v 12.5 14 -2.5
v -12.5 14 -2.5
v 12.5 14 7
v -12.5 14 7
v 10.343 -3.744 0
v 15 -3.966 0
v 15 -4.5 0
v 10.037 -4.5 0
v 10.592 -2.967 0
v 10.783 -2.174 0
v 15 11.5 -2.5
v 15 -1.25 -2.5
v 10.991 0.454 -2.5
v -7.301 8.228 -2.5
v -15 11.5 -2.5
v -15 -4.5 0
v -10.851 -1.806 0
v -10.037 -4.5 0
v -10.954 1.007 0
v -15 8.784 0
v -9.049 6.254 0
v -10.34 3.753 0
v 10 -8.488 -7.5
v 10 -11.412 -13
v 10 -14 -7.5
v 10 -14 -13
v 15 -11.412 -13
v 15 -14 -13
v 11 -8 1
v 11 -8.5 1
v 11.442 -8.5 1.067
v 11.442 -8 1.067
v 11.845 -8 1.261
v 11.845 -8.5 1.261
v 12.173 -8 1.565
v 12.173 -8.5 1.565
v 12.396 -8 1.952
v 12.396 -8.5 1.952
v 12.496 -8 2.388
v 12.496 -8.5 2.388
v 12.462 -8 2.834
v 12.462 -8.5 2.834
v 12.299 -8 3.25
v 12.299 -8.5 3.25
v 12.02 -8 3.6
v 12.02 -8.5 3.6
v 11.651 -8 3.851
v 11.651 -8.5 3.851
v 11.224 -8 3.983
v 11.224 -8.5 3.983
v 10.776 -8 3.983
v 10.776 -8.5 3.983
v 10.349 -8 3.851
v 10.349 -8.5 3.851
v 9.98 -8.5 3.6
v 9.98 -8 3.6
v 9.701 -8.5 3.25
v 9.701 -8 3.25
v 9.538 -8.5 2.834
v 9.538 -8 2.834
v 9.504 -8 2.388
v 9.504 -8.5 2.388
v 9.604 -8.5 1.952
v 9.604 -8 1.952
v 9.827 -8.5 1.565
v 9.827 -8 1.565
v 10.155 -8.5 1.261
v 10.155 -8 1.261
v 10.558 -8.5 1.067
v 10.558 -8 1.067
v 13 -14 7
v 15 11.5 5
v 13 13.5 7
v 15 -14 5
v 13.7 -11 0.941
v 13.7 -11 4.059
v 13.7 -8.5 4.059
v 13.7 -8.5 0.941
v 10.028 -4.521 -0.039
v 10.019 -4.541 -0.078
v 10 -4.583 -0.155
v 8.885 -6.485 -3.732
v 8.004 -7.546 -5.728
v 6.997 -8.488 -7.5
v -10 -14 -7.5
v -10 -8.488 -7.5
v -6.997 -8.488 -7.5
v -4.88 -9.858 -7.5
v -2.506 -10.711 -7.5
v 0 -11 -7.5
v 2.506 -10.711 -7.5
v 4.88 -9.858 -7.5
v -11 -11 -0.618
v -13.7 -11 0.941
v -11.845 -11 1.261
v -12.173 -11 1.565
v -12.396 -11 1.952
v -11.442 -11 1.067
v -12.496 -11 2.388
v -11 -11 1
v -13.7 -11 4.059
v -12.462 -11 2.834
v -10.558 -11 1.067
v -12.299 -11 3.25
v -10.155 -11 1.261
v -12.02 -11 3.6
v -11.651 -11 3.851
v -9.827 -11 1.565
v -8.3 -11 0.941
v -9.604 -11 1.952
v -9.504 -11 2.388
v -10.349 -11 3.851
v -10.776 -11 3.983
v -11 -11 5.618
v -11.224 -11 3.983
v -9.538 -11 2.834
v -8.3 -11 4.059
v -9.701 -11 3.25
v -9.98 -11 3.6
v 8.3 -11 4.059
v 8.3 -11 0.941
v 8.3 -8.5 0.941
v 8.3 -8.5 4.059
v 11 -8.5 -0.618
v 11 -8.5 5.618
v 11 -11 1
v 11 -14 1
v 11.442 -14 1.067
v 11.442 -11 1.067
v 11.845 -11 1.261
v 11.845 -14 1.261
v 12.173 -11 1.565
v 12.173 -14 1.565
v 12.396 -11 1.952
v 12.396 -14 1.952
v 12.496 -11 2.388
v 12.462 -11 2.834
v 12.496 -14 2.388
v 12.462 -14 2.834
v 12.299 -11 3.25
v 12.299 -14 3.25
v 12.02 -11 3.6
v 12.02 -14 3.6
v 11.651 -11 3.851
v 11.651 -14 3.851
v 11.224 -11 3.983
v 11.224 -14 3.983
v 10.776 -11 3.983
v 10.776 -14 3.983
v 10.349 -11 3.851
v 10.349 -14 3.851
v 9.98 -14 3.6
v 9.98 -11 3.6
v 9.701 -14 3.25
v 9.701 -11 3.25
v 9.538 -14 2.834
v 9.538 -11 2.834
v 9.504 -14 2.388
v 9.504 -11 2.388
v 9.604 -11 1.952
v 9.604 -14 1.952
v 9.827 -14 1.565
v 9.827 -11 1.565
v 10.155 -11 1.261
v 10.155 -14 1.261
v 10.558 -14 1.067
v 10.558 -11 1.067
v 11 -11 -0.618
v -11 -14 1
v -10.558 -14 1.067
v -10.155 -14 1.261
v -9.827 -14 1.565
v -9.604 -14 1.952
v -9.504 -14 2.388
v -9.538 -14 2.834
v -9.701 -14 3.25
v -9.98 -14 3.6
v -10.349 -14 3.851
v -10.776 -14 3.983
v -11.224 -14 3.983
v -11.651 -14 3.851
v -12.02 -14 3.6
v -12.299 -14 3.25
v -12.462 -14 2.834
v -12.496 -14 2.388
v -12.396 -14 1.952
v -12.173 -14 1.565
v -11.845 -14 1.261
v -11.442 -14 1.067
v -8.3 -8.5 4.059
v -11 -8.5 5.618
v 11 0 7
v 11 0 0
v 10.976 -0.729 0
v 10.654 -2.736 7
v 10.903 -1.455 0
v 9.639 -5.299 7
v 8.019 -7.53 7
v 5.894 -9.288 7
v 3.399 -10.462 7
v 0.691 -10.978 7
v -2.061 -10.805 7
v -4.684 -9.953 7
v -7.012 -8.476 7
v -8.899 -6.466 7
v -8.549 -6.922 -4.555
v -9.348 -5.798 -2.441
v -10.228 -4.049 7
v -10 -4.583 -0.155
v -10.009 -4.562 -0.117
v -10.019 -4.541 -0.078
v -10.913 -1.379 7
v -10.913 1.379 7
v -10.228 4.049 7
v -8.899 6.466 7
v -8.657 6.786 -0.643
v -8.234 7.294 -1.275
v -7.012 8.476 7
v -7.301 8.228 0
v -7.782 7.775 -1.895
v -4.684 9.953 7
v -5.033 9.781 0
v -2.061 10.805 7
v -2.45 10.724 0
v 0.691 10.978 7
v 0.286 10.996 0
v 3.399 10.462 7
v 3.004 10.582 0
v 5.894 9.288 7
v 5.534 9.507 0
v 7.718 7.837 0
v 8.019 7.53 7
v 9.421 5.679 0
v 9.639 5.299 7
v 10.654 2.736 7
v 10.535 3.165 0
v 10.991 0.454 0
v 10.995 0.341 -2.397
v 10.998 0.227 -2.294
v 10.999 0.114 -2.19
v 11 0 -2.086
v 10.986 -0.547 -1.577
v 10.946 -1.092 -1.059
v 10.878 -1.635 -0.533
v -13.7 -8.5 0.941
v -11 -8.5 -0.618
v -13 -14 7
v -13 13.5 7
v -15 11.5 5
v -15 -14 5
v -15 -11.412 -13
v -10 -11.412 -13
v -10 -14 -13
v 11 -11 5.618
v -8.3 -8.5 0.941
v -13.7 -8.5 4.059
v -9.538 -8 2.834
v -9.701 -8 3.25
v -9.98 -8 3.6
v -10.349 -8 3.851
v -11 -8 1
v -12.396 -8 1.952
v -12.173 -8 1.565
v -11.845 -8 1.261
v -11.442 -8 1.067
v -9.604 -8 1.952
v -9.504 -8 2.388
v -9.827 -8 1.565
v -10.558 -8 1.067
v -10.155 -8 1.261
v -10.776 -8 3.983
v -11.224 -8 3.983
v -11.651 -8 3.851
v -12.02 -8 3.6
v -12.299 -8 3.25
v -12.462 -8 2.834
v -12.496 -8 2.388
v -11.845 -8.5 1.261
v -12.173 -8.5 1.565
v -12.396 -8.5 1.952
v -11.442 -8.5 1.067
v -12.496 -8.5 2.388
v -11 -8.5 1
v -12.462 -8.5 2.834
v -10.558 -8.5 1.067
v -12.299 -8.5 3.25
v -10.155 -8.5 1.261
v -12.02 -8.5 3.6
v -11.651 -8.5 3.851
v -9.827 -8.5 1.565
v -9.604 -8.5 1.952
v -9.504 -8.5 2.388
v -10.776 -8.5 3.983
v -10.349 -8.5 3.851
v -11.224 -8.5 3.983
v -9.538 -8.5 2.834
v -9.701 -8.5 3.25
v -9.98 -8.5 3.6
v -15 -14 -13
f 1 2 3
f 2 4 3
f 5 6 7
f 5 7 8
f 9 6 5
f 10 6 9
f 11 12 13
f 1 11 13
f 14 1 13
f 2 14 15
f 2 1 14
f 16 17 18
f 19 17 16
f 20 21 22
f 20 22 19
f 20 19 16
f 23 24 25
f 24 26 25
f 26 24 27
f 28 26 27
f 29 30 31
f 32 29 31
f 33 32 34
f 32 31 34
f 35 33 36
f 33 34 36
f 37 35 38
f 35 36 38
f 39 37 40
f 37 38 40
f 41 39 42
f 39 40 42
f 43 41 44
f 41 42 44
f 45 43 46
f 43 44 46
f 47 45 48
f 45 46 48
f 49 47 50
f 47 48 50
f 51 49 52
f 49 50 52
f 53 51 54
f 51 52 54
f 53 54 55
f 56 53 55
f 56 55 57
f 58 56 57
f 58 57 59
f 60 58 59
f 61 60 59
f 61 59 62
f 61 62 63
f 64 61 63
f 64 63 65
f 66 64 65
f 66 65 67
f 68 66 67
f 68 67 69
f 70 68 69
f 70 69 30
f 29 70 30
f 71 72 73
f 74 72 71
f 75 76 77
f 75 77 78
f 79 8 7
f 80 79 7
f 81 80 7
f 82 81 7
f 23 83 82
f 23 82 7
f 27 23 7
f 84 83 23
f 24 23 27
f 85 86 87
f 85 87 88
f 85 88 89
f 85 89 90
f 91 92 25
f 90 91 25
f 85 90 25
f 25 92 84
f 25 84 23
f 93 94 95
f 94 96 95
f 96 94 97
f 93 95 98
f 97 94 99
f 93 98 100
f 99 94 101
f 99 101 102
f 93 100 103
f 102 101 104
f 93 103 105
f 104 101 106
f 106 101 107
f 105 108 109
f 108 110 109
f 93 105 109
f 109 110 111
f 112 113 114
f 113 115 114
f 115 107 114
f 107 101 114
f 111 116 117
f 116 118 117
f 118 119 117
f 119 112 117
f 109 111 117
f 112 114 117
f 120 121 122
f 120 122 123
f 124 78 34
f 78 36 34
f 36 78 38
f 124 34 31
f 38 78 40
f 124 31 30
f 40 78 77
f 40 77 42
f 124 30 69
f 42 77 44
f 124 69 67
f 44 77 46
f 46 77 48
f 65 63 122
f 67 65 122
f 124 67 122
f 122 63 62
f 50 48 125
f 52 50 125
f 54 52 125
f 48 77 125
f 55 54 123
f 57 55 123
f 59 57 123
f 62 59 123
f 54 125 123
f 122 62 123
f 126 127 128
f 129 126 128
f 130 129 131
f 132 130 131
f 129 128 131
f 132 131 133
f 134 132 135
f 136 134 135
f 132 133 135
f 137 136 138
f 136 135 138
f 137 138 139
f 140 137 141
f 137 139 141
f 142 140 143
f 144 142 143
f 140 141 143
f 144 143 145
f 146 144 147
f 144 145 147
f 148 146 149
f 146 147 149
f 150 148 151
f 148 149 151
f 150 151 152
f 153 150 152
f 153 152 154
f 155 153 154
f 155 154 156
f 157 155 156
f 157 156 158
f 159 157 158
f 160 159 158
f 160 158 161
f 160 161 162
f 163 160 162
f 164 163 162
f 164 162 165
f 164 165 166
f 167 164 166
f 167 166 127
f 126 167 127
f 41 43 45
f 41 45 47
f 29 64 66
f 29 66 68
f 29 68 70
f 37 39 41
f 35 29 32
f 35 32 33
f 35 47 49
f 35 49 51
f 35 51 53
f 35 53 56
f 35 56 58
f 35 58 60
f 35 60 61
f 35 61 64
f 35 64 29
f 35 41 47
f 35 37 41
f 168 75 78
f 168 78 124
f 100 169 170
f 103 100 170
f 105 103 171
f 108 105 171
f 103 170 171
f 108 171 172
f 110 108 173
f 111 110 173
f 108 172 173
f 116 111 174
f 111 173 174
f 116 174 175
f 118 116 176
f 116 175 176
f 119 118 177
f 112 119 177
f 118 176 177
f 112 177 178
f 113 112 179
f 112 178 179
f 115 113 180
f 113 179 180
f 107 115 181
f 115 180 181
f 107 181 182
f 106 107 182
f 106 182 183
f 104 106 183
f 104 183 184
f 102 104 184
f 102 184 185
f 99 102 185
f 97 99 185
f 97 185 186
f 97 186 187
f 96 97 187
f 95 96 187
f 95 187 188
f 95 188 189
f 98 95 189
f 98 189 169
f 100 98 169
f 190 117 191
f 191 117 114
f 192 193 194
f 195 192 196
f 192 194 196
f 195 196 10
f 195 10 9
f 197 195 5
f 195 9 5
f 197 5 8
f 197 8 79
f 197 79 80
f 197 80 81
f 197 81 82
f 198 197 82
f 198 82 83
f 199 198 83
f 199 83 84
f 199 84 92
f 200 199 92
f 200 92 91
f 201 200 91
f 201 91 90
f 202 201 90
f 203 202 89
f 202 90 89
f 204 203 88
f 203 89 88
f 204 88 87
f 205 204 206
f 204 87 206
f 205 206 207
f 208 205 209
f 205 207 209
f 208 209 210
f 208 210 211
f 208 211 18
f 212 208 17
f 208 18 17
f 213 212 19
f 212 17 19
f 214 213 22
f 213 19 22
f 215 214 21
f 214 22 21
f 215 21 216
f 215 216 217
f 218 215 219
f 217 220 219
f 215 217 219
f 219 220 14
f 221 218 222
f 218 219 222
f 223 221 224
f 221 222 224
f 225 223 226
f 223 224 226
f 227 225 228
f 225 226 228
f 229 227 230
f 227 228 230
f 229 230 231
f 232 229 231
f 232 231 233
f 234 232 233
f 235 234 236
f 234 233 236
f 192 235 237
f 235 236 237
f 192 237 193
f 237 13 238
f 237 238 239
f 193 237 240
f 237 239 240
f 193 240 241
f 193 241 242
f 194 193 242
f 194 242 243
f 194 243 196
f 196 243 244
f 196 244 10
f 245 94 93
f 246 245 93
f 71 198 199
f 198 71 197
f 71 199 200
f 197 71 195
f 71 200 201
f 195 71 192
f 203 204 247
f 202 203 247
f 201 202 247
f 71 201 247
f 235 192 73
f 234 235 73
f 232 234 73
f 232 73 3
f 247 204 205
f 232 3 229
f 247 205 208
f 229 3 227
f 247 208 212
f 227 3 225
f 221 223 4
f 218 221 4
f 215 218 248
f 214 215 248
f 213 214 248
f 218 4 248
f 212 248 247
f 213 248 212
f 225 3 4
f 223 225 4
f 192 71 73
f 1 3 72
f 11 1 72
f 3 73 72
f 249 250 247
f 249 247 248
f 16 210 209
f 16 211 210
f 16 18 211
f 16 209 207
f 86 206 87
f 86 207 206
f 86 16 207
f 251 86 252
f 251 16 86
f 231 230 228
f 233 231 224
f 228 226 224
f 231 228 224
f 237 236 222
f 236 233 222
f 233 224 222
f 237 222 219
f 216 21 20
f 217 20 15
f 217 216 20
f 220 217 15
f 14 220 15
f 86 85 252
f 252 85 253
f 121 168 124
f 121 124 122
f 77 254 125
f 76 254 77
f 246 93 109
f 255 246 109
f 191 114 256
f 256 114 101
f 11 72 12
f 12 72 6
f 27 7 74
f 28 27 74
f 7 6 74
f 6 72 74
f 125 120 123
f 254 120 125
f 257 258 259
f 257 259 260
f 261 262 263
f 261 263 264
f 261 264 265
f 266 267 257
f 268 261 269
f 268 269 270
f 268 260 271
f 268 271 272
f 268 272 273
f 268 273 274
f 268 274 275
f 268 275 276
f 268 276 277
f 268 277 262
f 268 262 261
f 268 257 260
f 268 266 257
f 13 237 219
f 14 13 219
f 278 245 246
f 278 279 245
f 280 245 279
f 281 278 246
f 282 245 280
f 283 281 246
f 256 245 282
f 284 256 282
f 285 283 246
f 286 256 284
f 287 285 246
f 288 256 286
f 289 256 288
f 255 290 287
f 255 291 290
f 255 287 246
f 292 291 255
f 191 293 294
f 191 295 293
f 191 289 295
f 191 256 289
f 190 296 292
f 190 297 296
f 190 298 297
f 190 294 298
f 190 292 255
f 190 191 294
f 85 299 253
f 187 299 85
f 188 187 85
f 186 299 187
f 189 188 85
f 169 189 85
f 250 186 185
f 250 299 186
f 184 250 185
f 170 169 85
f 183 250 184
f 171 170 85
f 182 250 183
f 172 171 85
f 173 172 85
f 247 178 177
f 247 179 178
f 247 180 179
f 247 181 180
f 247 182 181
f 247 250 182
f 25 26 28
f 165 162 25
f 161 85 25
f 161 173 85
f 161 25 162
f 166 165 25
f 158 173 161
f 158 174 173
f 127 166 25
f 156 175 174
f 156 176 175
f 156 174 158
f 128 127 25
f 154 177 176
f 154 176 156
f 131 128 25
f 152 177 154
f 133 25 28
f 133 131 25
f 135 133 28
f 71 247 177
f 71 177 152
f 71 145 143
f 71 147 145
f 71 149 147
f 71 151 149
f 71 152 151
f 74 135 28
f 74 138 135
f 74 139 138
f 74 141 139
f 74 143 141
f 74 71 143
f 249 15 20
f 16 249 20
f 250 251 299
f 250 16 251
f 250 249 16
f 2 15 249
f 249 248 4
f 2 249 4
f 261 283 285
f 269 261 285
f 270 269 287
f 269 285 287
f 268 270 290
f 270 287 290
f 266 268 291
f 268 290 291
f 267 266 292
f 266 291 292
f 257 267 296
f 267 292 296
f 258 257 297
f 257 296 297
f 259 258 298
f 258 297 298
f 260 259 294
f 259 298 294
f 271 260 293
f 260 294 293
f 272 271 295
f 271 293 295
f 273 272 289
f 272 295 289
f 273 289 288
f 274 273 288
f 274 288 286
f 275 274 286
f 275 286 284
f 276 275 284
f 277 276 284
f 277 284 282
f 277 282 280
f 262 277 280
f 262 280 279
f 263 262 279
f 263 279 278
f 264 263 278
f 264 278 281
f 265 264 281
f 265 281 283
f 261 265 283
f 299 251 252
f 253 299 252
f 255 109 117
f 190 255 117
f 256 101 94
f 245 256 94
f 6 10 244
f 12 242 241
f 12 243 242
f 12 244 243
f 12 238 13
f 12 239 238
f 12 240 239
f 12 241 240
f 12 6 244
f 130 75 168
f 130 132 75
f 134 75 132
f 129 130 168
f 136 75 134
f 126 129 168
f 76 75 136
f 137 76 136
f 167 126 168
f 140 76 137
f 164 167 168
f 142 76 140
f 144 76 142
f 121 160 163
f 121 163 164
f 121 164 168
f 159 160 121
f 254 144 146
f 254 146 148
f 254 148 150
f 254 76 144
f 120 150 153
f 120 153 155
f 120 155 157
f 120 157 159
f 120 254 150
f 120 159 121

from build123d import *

# Parameters (mm, degrees)
SKETCH1_R           = 11
BOSS_EXTRUDE1_DEPTH = 7
SKETCH2_W           = 5
SKETCH2_H           = 2.5
BOSS_EXTRUDE2_DEPTH = 13
CHAMFER2_SIZE       = 2
BOSS_EXTRUDE6_DEPTH = 2.5
CHAMFER3_SIZE       = 2
CHAMFER4_SIZE       = 2
BOSS_EXTRUDE4_DEPTH = 2.5
CHAMFER6_SIZE       = 2.5
CHAMFER7_SIZE       = 7
CHAMFER7_SIZE_2     = 13.165085257
CUT_EXTRUDE1_START  = -3
SKETCH6_R           = 1.5
CUT_EXTRUDE1_DEPTH  = 2.5
SKETCH7_R           = 1.5
CUT_EXTRUDE2_DEPTH  = 6


with BuildPart() as part:
    # Sketch1 → Boss-Extrude1 (new body)
    with BuildSketch(Plane.XY):
        Polygon((-15, 11.5), (-12.5, 14), (12.5, 14), (15, 11.5), (15, -14), (-15, -14), align=None)
        Circle(SKETCH1_R, mode=Mode.SUBTRACT)
    extrude(amount=BOSS_EXTRUDE1_DEPTH)

    # Sketch2 → Boss-Extrude2 (add)
    with BuildSketch(Plane(origin=(0, 0, 0), x_dir=(-1, 0, 0), z_dir=(0, 0, -1))):
        with Locations((-12.5, -12.75)):
            Rectangle(SKETCH2_W, SKETCH2_H)
        with Locations((12.5, -12.75)):
            Rectangle(SKETCH2_W, SKETCH2_H)
    extrude(amount=BOSS_EXTRUDE2_DEPTH)

    # Chamfer2
    chamfer2_edges = [part.edges().sort_by_distance(p)[0] for p in [
        (-10, -12.75, 0),
        (10, -12.75, 0),
    ]]
    chamfer(chamfer2_edges, length=CHAMFER2_SIZE)

    # Sketch5 → Boss-Extrude6 (add)
    with BuildSketch(Plane.XZ.offset(14)):
        Polygon((-10, -2), (-10, -7.5), (10, -7.5), (10, -2), (8, 0), (-8, 0), align=None)
    extrude(amount=-BOSS_EXTRUDE6_DEPTH)

    # Chamfer3
    chamfer3_edges = [part.edges().sort_by_distance(p)[0] for p in [
        (15, -1.25, 7),
    ]]
    chamfer(chamfer3_edges, length=CHAMFER3_SIZE)

    # Chamfer4
    chamfer4_edges = [part.edges().sort_by_distance(p)[0] for p in [
        (-15, -1.25, 7),
    ]]
    chamfer(chamfer4_edges, length=CHAMFER4_SIZE)

    # Sketch4 → Boss-Extrude4 (add)
    with BuildSketch(Plane(origin=(0, 0, 0), x_dir=(-1, 0, 0), z_dir=(0, 0, -1))):
        Polygon((-15, -1.25), (15, 11.5), (12.5, 14), (-12.5, 14), (-15, 11.5), align=None)
    extrude(amount=BOSS_EXTRUDE4_DEPTH)

    # Chamfer6
    # the kernel refuses this chamfer: 2.5 mm, written as the material it adds along each edge
    with BuildSketch(Plane(origin=(20.916998416, -3.764724327, 0), x_dir=(-0.39099275668343275, -0.9199829569021947, 0.02749587661058635), z_dir=(-0.9203309184584746, 0.39114064034485174, 0))) as chamfer6_piece_1_section:
        Polygon((CHAMFER6_SIZE * 0.999621916911, -CHAMFER6_SIZE * 0.0274958766106), (-CHAMFER6_SIZE * 0.0274958766106, -CHAMFER6_SIZE * 0.999621916911), (0, 0), align=None)
    chamfer6_piece_1 = extrude(amount=17.214861222, mode=Mode.PRIVATE)
    chamfer6_piece_1 = chamfer6_piece_1 - Plane(origin=(0, 0, -0.830769879), x_dir=(1, 0, 0), z_dir=(0, 0, -1)) * Cylinder(11, 45, mode=Mode.PRIVATE)
    chamfer6_piece_1 = split(chamfer6_piece_1, bisect_by=Plane(origin=(15, -1.305255327, -0.830769879), z_dir=(-1, 0, 0)), keep=Keep.TOP, mode=Mode.PRIVATE)
    add(chamfer6_piece_1)
    with BuildSketch(Plane(origin=(-1.383846422, 5.71313473, 0), x_dir=(-0.39099275668343275, -0.9199829569021946, 0.02749587661058637), z_dir=(-0.9203309184584746, 0.39114064034485174, 0))) as chamfer6_piece_2_section:
        Polygon((CHAMFER6_SIZE * 0.999621916911, -CHAMFER6_SIZE * 0.0274958766106), (-CHAMFER6_SIZE * 0.0274958766106, -CHAMFER6_SIZE * 0.999621916911), (0, 0), align=None)
    chamfer6_piece_2 = extrude(amount=21.224052785, mode=Mode.PRIVATE)
    chamfer6_piece_2 = chamfer6_piece_2 - Plane(origin=(0, 0, -0.851096237), x_dir=(1, 0, 0), z_dir=(0, 0, -1)) * Cylinder(11, 53, mode=Mode.PRIVATE)
    chamfer6_piece_2 = split(chamfer6_piece_2, bisect_by=Plane(origin=(-15, 9.126408424, -0.851096237), z_dir=(1, 0, 0)), keep=Keep.TOP, mode=Mode.PRIVATE)
    add(chamfer6_piece_2)

    # Chamfer7
    # the kernel refuses this chamfer: 13.165085257, 7 mm, written as the material it adds along each edge
    with BuildSketch(Plane(origin=(-15, -11.5, 0), x_dir=(0, 0.9979482451756082, 0.06402577567608186), z_dir=(1, 0, 0))) as chamfer7_piece_1_section:
        Polygon((CHAMFER7_SIZE * 0.997948245176, -CHAMFER7_SIZE * 0.0640257756761), (-CHAMFER7_SIZE_2 * 0.0640257756781, -CHAMFER7_SIZE_2 * 0.997948245208), (0, 0), align=None)
    chamfer7_piece_1 = extrude(amount=30, mode=Mode.PRIVATE)
    chamfer7_piece_1 = chamfer7_piece_1 - Plane(origin=(0, 0, -3.073682767), x_dir=(1, 0, 0), z_dir=(0, 0, -1)) * Cylinder(11, 113, mode=Mode.PRIVATE)
    chamfer7_piece_1 = split(chamfer7_piece_1, bisect_by=Plane(origin=(-12.500128058, -8.887755394, -7.5), z_dir=(0, 0, 1)), keep=Keep.TOP, mode=Mode.PRIVATE)
    chamfer7_piece_1 = split(chamfer7_piece_1, bisect_by=Plane(origin=(-10, -8.887755394, -3.073682767), z_dir=(-1, 0, 0)), keep=Keep.TOP, mode=Mode.PRIVATE)
    add(chamfer7_piece_1)
    with BuildSketch(Plane(origin=(-15, -11.5, 0), x_dir=(0, 0.9979482451756082, 0.06402577567608186), z_dir=(1, 0, 0))) as chamfer7_piece_2_section:
        Polygon((CHAMFER7_SIZE * 0.997948245176, -CHAMFER7_SIZE * 0.0640257756761), (-CHAMFER7_SIZE_2 * 0.0640257756781, -CHAMFER7_SIZE_2 * 0.997948245208), (0, 0), align=None)
    chamfer7_piece_2 = extrude(amount=30, mode=Mode.PRIVATE)
    chamfer7_piece_2 = split(chamfer7_piece_2, bisect_by=Plane(origin=(-12.5, -10.721530873, -7.5), z_dir=(0, 0, -1)), keep=Keep.TOP, mode=Mode.PRIVATE)
    chamfer7_piece_2 = split(chamfer7_piece_2, bisect_by=Plane(origin=(-10, -10.721530873, -9.597564575), z_dir=(-1, 0, 0)), keep=Keep.TOP, mode=Mode.PRIVATE)
    chamfer7_piece_2 = split(chamfer7_piece_2, bisect_by=Plane(origin=(-12.5, -10.721530873, -13), z_dir=(0, 0, 1)), keep=Keep.TOP, mode=Mode.PRIVATE)
    add(chamfer7_piece_2)
    with BuildSketch(Plane(origin=(-15, -11.5, 0), x_dir=(0, 0.9979482451756082, 0.06402577567608186), z_dir=(1, 0, 0))) as chamfer7_piece_3_section:
        Polygon((CHAMFER7_SIZE * 0.997948245176, -CHAMFER7_SIZE * 0.0640257756761), (-CHAMFER7_SIZE_2 * 0.0640257756781, -CHAMFER7_SIZE_2 * 0.997948245208), (0, 0), align=None)
    chamfer7_piece_3 = extrude(amount=30, mode=Mode.PRIVATE)
    chamfer7_piece_3 = chamfer7_piece_3 - Plane(origin=(0, 0, -3.793876077), x_dir=(1, 0, 0), z_dir=(0, 0, -1)) * Cylinder(11, 113, mode=Mode.PRIVATE)
    chamfer7_piece_3 = split(chamfer7_piece_3, bisect_by=Plane(origin=(-9.499486782, -6.598719884, -7.5), z_dir=(0, 0, 1)), keep=Keep.TOP, mode=Mode.PRIVATE)
    chamfer7_piece_3 = split(chamfer7_piece_3, bisect_by=Plane(origin=(10, -6.598719884, -3.793876077), z_dir=(-1, 0, 0)), keep=Keep.TOP, mode=Mode.PRIVATE)
    chamfer7_piece_3 = split(chamfer7_piece_3, bisect_by=Plane(origin=(-10, -6.598719884, -3.793876077), z_dir=(1, 0, 0)), keep=Keep.TOP, mode=Mode.PRIVATE)
    add(chamfer7_piece_3)
    with BuildSketch(Plane(origin=(-15, -11.5, 0), x_dir=(0, 0.9979482451756082, 0.06402577567608186), z_dir=(1, 0, 0))) as chamfer7_piece_4_section:
        Polygon((CHAMFER7_SIZE * 0.997948245176, -CHAMFER7_SIZE * 0.0640257756761), (-CHAMFER7_SIZE_2 * 0.0640257756781, -CHAMFER7_SIZE_2 * 0.997948245208), (0, 0), align=None)
    chamfer7_piece_4 = extrude(amount=30, mode=Mode.PRIVATE)
    chamfer7_piece_4 = split(chamfer7_piece_4, bisect_by=Plane(origin=(12.5, -10.721530873, -7.5), z_dir=(0, 0, -1)), keep=Keep.TOP, mode=Mode.PRIVATE)
    chamfer7_piece_4 = split(chamfer7_piece_4, bisect_by=Plane(origin=(10, -10.721530873, -9.597564575), z_dir=(1, 0, 0)), keep=Keep.TOP, mode=Mode.PRIVATE)
    chamfer7_piece_4 = split(chamfer7_piece_4, bisect_by=Plane(origin=(12.5, -10.721530873, -13), z_dir=(0, 0, 1)), keep=Keep.TOP, mode=Mode.PRIVATE)
    add(chamfer7_piece_4)
    with BuildSketch(Plane(origin=(-15, -11.5, 0), x_dir=(0, 0.9979482451756082, 0.06402577567608186), z_dir=(1, 0, 0))) as chamfer7_piece_5_section:
        Polygon((CHAMFER7_SIZE * 0.997948245176, -CHAMFER7_SIZE * 0.0640257756761), (-CHAMFER7_SIZE_2 * 0.0640257756781, -CHAMFER7_SIZE_2 * 0.997948245208), (0, 0), align=None)
    chamfer7_piece_5 = extrude(amount=30, mode=Mode.PRIVATE)
    chamfer7_piece_5 = chamfer7_piece_5 - Plane(origin=(0, 0, -3.073682766), x_dir=(1, 0, 0), z_dir=(0, 0, -1)) * Cylinder(11, 113, mode=Mode.PRIVATE)
    chamfer7_piece_5 = split(chamfer7_piece_5, bisect_by=Plane(origin=(12.500128057, -8.887755394, -7.5), z_dir=(0, 0, 1)), keep=Keep.TOP, mode=Mode.PRIVATE)
    chamfer7_piece_5 = split(chamfer7_piece_5, bisect_by=Plane(origin=(10, -8.887755394, -3.073682766), z_dir=(1, 0, 0)), keep=Keep.TOP, mode=Mode.PRIVATE)
    add(chamfer7_piece_5)

    # Sketch6 → Cut-Extrude1 (cut)
    # profile 1 of 2: a face of its own
    with BuildSketch(Plane.XZ.offset(14).offset(CUT_EXTRUDE1_START)):
        Polygon((-8.3, 0.941154273), (-8.3, 4.058845727), (-11, 5.617691454), (-13.7, 4.058845727), (-13.7, 0.941154273), (-11, -0.617691454), align=None)
        with Locations(Location((-11, 2.5, 0), (0, 0, 270))):
            Circle(SKETCH6_R, mode=Mode.SUBTRACT)
    # profile 2 of 2: a face of its own
    with BuildSketch(Plane.XZ.offset(14).offset(CUT_EXTRUDE1_START)):
        Polygon((11, -0.617691454), (8.3, 0.941154273), (8.3, 4.058845727), (11, 5.617691454), (13.7, 4.058845727), (13.7, 0.941154273), align=None)
    extrude(amount=-CUT_EXTRUDE1_DEPTH, mode=Mode.SUBTRACT)

    # Sketch7 → Cut-Extrude2 (cut)
    with BuildSketch(Plane.XZ.offset(14)):
        with Locations(Location((11, 2.5, 0), (0, 0, 270))):
            Circle(SKETCH7_R)
        with Locations(Location((-11, 2.5, 0), (0, 0, 270))):
            Circle(SKETCH7_R)
    extrude(amount=-CUT_EXTRUDE2_DEPTH, mode=Mode.SUBTRACT)


solid = part.part
